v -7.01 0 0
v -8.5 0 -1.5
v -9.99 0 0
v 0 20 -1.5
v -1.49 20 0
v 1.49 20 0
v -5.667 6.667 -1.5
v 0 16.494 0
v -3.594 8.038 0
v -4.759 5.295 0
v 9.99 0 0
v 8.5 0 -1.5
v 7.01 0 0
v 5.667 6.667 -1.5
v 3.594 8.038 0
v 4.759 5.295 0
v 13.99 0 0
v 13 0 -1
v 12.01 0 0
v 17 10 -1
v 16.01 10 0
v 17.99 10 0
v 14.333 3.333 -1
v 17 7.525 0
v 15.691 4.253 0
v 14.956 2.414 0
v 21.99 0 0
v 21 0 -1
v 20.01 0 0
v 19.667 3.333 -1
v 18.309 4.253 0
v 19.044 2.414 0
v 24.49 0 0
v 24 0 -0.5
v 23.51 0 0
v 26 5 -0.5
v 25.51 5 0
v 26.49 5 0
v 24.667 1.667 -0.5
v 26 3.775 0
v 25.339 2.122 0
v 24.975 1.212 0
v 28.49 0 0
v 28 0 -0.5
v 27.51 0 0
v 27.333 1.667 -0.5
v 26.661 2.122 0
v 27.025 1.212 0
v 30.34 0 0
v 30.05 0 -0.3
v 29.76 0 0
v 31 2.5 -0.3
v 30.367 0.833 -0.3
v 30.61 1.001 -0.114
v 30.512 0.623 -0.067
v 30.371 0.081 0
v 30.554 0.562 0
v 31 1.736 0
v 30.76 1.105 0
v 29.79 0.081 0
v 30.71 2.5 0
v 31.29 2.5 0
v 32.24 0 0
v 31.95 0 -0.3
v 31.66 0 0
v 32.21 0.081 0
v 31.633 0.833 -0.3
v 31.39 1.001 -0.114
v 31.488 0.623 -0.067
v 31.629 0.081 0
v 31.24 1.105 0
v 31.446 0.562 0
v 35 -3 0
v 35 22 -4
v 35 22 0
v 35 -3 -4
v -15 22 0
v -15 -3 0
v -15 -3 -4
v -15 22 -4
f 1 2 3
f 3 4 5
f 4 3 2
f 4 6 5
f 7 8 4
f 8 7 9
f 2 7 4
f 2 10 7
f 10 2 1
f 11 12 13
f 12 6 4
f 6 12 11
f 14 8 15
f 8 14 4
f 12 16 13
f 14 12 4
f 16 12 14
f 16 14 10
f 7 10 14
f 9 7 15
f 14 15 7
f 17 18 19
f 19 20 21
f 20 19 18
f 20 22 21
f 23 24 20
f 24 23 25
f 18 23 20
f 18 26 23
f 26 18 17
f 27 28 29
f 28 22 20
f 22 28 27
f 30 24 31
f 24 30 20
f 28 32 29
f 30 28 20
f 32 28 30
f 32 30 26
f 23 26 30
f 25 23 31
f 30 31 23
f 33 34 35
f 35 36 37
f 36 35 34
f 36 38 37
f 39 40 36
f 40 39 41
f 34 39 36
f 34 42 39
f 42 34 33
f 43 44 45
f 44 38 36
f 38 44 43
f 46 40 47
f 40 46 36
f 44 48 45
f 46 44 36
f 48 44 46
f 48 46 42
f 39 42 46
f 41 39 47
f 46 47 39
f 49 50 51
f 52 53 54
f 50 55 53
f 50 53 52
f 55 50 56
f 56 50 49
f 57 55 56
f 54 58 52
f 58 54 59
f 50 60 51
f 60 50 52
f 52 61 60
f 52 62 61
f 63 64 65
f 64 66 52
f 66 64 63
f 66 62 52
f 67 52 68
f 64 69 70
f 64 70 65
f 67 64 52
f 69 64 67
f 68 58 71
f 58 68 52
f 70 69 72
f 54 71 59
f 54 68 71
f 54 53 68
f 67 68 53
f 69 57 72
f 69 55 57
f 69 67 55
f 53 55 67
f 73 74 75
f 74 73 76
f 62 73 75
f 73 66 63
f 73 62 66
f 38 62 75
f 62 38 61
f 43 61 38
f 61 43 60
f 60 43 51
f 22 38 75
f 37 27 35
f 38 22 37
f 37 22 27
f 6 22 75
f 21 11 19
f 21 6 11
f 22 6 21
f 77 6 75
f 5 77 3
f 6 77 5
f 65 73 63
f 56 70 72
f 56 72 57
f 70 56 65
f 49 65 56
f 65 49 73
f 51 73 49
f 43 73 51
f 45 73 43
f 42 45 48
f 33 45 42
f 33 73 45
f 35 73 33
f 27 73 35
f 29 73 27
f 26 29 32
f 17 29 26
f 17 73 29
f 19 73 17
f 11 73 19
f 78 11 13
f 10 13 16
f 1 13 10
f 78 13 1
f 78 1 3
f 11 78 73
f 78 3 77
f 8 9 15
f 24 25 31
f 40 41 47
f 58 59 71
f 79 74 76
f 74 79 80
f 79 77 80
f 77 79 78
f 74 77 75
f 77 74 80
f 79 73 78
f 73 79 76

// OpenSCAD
/* Engraved letter forms.
   by Mike Koss
*/

E = 0.01;

module letter_a(height=20, line_width=3, width=0, depth=0) {
  real_depth = depth == 0 ? line_width / 2 : depth;
  real_width = width == 0 ? height : width;
  d = [line_width / 2, 0];

  // bottom left
  c1 = [-real_width / 2 + line_width / 2, 0];
  a1 = c1 - d;
  a2 = c1 + d;

  // top
  c2 = [0, height];
  a3 = c2 - d;
  a4 = c2 + d;

  // bottom right
  c3 = [real_width / 2 - line_width / 2, 0];
  a5 = c3 - d;
  a6 = c3 + d;

  // center left
  c_left = (2 * c1 + c2) / 3;
  v_left = line_width / 2 * unit(c2 - c1);
  a7 = c_left + v_left;
  a8 = c_left - v_left;

  // center right
  c_right = (2 * c3 + c2) / 3;
  v_right = line_width / 2 * unit(c2 - c3);
  a9 = c_right + v_right;
  a10 = c_right - v_right;

  cut(real_depth, [a1, a2, a4, a3]);
  cut(real_depth, [a5, a6, a4, a3]);
  cut(real_depth, [a7, a8, a10, a9]);
}

/*
     3---2
    /  5/
   /   /
  0---1
    4
*/
module cut(depth, top) {
  c1 = (top[0] + top[1]) / 2;
  c2 = (top[2] + top[3]) / 2;
  polyhedron(
    points=[level(top[0], E), level(top[1], E), level(top[2], E), level(top[3], E),
             level(c1, -depth), level(c2, -depth)],
    triangles=[
      [0, 1, 4], [2, 3, 5],
      [1, 2, 5], [1, 5, 4],
      [0, 5, 3], [0, 4, 5],
      [0, 3, 2], [0, 2, 1]
    ]
  );
}

function level(p, d) = [p[0], p[1], d];

function unit(v) = v / sqrt((v * v));

trials = [[20, 3, 0], [10, 2, 17],
          [5, 1, 26], [2.5, 0.6, 31]];
difference() {
  translate([-15, -3, -4]) cube([50, 25, 4]);
  for (i = [0: len(trials) - 1]) assign(p = trials[i]) {
    translate([p[2], 0, 0])
      letter_a(p[0], p[1]);
  }
}
